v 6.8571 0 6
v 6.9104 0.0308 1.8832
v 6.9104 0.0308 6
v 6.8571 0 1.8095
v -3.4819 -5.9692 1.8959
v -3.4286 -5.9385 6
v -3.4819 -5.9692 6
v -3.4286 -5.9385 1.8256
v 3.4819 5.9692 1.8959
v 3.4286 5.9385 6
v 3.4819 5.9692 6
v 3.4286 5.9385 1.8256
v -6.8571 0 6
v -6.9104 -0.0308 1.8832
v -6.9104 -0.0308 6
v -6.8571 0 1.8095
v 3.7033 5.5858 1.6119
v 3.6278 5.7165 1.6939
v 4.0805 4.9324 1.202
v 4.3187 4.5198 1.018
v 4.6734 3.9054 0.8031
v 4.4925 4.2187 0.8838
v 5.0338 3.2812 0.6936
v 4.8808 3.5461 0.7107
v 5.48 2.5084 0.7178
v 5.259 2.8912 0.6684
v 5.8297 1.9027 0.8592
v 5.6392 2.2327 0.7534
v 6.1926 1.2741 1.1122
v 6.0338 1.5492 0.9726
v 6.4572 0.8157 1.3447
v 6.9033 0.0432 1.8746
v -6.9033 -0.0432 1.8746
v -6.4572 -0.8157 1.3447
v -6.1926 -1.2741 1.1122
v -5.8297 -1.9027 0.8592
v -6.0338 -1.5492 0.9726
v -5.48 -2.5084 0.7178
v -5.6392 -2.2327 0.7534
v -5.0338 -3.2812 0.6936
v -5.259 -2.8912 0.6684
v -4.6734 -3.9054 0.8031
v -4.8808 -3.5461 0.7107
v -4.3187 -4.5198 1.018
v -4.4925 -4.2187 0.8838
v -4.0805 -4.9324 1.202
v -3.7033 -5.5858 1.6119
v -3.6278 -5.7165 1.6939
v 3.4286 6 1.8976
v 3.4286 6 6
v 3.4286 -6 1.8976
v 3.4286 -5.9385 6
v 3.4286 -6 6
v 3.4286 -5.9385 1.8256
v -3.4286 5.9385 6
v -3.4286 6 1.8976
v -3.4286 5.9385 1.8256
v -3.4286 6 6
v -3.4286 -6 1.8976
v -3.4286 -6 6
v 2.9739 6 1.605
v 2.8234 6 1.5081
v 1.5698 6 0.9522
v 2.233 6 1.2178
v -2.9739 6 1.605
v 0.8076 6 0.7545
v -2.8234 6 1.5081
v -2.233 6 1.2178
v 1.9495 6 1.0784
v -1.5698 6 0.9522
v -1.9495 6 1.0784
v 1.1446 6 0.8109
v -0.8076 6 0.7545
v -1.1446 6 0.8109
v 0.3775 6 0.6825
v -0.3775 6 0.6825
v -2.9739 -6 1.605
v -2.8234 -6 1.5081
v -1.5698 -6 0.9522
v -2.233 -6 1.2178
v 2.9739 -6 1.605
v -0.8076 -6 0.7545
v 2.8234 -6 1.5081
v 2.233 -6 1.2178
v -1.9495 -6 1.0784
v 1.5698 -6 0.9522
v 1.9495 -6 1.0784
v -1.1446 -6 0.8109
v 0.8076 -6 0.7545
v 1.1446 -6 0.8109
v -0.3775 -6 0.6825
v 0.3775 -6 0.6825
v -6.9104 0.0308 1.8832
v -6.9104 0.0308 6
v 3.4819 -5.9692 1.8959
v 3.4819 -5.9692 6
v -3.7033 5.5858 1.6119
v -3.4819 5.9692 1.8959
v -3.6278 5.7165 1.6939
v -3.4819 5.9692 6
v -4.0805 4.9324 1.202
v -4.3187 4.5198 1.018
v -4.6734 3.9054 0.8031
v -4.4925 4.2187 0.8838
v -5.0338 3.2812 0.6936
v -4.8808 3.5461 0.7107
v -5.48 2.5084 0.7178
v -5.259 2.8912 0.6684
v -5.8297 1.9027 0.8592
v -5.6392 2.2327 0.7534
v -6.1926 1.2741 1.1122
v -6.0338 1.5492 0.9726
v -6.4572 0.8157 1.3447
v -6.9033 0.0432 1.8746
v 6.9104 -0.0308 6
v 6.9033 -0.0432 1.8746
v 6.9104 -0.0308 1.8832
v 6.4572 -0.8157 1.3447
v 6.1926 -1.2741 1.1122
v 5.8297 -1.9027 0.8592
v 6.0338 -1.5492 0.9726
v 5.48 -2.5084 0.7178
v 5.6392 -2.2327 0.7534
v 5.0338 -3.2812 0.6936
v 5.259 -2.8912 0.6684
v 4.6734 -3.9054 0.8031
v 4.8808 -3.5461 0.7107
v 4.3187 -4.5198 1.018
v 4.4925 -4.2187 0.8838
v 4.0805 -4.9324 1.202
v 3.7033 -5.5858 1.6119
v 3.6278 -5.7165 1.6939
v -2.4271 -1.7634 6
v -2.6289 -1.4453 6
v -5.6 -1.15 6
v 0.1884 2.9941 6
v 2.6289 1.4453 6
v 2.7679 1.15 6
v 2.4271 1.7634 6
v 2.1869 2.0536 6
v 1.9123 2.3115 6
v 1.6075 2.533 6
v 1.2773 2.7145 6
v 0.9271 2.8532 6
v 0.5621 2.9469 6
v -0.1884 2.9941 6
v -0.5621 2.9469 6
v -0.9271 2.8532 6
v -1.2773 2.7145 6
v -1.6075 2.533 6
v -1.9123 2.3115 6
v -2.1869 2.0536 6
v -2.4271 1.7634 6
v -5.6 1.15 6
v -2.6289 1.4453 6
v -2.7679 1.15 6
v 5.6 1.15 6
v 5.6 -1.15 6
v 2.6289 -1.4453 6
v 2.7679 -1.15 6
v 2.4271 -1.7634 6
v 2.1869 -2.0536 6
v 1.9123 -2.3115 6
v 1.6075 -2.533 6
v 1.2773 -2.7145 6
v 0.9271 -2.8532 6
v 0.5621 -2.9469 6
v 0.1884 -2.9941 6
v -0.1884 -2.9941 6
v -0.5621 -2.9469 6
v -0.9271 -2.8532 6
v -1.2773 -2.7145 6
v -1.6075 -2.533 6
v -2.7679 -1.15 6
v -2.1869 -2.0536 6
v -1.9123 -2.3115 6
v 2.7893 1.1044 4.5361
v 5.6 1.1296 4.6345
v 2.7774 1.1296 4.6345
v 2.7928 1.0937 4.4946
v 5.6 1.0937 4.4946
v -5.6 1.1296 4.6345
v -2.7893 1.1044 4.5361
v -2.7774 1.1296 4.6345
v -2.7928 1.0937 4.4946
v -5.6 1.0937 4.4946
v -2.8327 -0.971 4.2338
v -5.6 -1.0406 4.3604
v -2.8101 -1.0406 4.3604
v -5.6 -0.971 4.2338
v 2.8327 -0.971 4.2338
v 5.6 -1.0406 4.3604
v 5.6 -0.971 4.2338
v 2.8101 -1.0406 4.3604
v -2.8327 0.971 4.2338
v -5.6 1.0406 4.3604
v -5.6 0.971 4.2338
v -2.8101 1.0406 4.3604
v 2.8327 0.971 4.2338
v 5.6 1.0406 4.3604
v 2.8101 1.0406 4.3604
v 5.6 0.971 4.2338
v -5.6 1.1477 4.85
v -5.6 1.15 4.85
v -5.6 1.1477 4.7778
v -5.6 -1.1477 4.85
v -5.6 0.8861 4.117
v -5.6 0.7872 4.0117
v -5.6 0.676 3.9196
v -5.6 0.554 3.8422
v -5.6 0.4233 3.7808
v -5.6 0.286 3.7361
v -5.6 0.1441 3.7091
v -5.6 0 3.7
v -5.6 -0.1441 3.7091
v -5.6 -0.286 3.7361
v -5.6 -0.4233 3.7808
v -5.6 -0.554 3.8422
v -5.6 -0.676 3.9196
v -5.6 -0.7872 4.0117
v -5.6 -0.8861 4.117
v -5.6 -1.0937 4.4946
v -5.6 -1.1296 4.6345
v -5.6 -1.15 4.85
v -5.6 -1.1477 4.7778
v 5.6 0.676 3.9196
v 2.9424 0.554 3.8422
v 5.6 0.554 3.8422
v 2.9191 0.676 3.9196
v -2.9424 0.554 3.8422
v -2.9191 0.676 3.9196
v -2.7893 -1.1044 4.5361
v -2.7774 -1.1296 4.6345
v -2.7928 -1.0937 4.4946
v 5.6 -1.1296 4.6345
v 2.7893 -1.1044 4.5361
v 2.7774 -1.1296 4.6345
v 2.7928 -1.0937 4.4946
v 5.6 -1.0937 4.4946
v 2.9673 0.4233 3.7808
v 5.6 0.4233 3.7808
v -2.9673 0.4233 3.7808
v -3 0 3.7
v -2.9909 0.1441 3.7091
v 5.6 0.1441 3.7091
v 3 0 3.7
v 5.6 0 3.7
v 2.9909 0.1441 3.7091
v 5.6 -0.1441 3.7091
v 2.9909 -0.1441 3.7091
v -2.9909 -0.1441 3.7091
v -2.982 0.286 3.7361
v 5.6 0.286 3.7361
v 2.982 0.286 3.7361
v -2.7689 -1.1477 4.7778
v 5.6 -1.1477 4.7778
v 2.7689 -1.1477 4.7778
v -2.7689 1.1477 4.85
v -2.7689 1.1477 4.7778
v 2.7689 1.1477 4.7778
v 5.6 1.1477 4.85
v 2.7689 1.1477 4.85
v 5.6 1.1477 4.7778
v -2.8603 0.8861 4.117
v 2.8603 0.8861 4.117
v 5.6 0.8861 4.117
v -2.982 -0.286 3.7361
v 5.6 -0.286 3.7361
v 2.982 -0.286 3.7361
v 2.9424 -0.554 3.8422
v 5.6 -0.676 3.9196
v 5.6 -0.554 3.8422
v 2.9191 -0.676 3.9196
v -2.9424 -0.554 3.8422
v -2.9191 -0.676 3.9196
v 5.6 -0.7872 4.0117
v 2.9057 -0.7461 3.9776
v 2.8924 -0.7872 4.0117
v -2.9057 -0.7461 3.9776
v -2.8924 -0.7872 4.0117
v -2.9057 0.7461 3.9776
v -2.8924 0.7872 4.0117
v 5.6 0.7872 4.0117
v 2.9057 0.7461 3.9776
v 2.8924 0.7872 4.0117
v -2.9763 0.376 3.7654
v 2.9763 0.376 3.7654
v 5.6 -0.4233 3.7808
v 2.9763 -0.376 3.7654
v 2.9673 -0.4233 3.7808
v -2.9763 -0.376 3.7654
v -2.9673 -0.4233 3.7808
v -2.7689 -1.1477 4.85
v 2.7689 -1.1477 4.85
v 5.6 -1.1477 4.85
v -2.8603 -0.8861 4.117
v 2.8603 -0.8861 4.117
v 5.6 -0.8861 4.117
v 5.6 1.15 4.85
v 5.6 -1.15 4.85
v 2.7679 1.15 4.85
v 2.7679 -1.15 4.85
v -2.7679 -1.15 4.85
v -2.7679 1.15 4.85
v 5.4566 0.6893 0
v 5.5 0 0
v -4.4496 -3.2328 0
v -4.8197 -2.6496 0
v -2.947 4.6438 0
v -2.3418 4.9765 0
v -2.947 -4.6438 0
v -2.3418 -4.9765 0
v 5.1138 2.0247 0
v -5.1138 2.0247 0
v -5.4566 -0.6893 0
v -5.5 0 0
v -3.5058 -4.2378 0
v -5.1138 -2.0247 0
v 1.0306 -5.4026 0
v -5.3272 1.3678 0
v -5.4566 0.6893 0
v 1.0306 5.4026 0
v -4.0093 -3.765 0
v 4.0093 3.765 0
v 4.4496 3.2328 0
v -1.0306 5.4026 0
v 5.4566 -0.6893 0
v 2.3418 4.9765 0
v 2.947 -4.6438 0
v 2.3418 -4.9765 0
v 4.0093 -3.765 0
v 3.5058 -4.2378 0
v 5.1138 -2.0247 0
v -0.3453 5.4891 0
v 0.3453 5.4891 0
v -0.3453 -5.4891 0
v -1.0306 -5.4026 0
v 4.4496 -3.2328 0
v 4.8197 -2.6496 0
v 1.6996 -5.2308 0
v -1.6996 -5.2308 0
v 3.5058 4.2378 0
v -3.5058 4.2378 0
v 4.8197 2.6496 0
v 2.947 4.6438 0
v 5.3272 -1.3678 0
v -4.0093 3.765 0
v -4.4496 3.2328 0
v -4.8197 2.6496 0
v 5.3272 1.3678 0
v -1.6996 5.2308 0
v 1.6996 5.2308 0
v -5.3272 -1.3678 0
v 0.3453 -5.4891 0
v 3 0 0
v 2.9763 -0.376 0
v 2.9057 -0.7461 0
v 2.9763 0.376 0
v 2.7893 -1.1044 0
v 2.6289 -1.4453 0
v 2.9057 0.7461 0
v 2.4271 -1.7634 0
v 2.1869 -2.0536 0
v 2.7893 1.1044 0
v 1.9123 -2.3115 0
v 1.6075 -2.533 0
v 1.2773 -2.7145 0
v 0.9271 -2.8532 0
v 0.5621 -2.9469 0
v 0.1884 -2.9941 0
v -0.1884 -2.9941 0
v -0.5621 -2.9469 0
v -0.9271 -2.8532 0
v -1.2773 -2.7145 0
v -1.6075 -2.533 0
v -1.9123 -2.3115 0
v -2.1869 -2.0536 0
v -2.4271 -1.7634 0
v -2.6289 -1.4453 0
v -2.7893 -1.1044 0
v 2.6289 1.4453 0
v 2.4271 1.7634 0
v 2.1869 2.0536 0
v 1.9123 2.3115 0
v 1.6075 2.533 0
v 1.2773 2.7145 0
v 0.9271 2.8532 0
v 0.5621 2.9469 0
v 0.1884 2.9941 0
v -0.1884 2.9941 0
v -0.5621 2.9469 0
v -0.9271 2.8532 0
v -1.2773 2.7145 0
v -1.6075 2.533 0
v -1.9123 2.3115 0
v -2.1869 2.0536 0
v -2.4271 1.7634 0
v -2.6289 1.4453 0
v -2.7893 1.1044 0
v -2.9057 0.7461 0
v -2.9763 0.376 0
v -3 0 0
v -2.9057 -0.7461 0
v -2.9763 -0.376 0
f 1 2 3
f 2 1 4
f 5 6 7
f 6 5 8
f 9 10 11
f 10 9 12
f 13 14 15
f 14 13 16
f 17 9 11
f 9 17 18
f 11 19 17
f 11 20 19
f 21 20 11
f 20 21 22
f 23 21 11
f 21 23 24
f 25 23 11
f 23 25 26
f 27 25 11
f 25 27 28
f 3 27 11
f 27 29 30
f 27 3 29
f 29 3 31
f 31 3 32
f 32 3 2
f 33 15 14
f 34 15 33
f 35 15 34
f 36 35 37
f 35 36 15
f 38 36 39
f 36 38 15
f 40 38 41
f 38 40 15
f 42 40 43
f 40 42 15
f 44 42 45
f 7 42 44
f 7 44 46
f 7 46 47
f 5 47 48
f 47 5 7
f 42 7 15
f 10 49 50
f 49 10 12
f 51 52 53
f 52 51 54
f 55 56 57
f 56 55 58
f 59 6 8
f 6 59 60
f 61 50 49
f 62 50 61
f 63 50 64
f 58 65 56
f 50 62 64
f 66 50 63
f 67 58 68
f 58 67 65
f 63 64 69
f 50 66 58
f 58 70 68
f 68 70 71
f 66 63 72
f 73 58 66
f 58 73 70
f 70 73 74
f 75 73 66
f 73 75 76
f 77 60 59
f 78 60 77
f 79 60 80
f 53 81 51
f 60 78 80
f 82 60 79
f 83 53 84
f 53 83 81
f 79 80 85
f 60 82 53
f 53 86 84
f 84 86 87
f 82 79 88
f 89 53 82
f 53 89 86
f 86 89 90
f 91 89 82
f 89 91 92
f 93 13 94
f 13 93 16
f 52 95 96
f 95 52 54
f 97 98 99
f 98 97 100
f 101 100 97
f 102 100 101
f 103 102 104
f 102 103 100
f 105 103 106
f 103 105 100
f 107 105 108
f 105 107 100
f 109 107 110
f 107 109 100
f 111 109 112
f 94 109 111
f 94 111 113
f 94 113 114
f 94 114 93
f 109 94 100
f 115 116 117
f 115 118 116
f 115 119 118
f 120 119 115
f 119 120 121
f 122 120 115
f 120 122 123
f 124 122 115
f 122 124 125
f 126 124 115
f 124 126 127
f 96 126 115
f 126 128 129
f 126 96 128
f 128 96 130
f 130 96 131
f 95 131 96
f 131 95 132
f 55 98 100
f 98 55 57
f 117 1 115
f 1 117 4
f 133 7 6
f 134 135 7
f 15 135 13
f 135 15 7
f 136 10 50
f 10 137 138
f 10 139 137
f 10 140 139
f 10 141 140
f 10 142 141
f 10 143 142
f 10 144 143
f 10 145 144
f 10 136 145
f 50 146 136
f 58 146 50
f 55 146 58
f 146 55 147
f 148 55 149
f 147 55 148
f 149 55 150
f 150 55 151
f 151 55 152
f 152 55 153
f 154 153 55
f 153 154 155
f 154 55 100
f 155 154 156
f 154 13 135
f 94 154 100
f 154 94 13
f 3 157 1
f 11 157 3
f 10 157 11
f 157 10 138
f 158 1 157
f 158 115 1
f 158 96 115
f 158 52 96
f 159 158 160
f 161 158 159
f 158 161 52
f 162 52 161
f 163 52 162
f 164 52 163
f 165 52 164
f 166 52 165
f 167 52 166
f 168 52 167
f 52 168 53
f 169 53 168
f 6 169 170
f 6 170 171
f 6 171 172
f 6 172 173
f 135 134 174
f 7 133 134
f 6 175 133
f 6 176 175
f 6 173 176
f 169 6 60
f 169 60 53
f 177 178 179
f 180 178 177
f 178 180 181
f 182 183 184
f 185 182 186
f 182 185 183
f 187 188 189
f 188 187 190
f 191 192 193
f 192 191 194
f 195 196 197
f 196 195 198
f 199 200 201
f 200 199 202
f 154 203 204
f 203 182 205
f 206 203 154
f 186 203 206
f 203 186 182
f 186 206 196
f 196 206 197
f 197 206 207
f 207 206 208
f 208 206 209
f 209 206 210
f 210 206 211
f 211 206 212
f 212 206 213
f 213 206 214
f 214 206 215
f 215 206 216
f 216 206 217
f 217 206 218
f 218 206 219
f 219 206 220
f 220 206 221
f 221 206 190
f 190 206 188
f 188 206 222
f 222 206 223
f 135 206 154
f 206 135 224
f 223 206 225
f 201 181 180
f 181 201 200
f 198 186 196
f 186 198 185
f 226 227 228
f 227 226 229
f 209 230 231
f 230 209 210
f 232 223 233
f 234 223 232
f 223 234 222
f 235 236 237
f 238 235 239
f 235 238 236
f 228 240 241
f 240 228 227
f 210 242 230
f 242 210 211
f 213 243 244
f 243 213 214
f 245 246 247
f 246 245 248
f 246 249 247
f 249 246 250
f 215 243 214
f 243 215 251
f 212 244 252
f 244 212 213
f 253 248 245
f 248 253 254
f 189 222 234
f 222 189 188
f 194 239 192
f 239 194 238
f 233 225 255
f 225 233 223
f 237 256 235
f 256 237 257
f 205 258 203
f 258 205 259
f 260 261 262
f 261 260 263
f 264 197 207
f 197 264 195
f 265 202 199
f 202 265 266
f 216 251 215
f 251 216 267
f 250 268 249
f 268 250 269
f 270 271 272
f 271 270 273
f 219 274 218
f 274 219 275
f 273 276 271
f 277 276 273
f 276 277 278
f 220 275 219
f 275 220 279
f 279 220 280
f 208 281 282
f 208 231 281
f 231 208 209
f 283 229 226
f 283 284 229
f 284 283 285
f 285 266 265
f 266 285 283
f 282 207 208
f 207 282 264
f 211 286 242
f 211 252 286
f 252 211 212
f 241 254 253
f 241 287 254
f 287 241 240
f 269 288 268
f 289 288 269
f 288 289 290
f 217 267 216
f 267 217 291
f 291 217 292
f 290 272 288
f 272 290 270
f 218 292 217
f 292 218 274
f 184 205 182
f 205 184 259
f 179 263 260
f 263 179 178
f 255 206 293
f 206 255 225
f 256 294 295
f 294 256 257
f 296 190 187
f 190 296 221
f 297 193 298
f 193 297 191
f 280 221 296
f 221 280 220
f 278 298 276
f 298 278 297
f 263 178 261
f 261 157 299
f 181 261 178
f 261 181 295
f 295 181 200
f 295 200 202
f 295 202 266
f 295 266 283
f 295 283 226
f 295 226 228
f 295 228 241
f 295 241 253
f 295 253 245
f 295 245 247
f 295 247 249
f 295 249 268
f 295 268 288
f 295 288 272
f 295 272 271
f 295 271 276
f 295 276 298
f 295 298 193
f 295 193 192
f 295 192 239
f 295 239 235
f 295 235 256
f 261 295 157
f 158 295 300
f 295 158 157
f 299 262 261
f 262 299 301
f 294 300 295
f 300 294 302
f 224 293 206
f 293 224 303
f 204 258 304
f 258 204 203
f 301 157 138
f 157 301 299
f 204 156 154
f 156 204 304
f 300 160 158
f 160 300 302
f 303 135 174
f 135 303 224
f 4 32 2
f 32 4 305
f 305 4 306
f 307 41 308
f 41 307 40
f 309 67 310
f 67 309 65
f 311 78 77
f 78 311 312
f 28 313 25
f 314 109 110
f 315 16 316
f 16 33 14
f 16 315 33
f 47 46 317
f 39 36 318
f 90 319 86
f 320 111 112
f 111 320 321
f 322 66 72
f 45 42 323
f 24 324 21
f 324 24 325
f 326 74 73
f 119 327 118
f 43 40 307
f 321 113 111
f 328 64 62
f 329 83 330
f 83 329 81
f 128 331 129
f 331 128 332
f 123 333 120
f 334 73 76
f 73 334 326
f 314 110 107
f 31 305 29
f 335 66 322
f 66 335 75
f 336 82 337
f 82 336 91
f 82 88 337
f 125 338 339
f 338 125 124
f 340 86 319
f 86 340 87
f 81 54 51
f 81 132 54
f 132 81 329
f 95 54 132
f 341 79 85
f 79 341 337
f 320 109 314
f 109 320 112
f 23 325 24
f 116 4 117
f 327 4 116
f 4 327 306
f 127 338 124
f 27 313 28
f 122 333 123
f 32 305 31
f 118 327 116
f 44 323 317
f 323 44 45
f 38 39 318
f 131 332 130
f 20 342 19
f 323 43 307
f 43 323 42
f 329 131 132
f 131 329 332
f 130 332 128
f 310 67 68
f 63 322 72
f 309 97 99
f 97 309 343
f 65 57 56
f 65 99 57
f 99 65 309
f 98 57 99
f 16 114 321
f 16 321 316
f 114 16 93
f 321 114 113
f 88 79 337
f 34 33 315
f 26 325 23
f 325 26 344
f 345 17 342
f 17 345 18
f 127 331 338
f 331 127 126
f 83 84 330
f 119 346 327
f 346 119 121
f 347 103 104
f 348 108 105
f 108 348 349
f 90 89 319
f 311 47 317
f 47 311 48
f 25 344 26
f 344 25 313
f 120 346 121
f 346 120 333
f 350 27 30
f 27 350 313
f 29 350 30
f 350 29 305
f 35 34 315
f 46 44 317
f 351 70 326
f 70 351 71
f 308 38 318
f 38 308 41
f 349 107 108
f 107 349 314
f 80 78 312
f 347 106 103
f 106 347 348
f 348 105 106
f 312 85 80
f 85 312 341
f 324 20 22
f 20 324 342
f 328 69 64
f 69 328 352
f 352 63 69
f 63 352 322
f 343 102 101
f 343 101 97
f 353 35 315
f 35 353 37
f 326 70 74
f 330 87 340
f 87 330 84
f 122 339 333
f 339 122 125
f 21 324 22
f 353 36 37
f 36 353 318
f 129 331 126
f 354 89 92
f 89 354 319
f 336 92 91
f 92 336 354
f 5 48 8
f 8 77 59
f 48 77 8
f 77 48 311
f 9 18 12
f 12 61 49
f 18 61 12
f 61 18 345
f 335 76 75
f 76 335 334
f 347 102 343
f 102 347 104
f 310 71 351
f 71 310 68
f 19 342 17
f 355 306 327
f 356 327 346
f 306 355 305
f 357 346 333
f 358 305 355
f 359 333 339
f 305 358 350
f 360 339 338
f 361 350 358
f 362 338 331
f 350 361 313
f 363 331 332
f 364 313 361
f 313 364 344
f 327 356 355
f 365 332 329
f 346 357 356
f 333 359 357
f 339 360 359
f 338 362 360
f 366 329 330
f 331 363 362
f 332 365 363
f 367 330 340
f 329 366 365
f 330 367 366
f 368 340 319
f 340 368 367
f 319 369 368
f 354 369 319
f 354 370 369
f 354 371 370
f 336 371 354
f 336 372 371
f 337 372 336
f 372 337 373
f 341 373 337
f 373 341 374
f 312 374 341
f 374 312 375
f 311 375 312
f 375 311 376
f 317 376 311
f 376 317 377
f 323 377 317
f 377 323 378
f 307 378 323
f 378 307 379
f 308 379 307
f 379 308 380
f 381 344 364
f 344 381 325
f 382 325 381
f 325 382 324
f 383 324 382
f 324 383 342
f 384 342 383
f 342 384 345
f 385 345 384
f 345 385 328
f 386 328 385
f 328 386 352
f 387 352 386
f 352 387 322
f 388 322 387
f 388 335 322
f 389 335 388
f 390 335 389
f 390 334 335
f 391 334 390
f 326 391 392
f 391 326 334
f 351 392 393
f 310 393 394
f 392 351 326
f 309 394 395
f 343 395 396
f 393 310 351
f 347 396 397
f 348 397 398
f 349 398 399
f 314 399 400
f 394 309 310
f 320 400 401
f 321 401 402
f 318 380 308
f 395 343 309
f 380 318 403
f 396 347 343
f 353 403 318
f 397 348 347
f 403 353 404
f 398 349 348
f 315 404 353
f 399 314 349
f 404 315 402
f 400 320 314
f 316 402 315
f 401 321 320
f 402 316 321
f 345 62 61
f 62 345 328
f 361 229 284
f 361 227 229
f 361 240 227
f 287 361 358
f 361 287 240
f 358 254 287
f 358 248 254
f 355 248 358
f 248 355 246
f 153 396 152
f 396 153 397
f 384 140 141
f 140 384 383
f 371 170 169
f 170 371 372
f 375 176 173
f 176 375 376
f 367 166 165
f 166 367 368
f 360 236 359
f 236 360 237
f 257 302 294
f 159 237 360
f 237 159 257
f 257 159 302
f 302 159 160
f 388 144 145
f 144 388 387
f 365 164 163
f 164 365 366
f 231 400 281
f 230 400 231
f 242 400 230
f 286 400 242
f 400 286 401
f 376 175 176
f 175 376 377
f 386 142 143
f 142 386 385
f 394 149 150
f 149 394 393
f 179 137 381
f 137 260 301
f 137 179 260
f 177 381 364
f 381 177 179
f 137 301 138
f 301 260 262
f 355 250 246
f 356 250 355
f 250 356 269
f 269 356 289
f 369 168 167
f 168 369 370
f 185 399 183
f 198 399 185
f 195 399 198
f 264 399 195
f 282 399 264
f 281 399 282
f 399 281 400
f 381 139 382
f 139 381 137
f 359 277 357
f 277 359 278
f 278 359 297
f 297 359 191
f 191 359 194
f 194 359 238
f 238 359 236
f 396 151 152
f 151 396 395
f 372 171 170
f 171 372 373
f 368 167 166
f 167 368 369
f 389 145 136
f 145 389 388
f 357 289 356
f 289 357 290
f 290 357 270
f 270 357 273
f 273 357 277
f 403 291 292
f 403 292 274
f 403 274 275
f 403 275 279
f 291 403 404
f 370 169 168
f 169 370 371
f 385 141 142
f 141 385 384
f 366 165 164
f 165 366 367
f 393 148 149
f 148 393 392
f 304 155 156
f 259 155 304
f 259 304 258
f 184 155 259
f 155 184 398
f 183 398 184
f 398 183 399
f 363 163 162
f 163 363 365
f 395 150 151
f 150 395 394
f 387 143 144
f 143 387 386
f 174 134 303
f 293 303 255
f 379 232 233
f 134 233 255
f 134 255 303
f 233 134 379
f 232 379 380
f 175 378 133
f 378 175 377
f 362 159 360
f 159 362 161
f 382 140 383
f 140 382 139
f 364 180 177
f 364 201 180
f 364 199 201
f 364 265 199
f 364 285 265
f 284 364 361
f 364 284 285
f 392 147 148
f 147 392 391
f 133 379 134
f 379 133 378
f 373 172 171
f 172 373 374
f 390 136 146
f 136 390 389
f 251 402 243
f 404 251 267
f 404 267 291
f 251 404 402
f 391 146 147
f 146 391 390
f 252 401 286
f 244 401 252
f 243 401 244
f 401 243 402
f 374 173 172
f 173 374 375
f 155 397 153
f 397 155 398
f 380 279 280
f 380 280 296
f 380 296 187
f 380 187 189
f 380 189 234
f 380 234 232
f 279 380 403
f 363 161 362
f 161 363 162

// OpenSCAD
include <MCAD/shapes.scad>;

$fn = 50;	// rounded edge quality (# of faces per 360 degrees)

hex_mm = 12;		// adjust hex size, default 12
// HEX PART HEIGHT -- MODIFY THIS!
hex_height = 6;	// adjust your rim offset, default 6
pin_depth = 2.3;	// adjust for deeper or shallower pin engagement depth, default 2.3
pin_length = 11.2;	// length of axle pin, default 11.2
pin_width = 2.3;	// width of axle pin, default 2.3
axle_hole = 3;		// axle hole diameter, default 3
flare_height = 2;	// flare lead-in up the side of the hex body, default 2

difference(){	// put hole all the way through
	union(){	// combine fillet shape (base) with rest of hex body
		difference(){	// cut rectangular slot from hex body
			translate([0,0,(hex_height-flare_height-((hex_height-6)/2))]) hexagon(hex_mm,(hex_height-flare_height));	// 12mm hex
			 translate([0,0,(hex_height-(pin_depth/2))]) rotate([90,90,90]) cylinder(pin_length,(pin_depth/2),(pin_depth/2), center = true);	// pin cut-out cylinder
			 translate([(pin_length/2*-1),(pin_width/2*-1),(hex_height-(pin_depth/2))]) cube(size=[pin_length,pin_width,pin_depth+1], center = false);	// pin cut-out rectangle
		}
		difference(){	// clear anything extending beyond hex_mm size
			cylinder(flare_height,5.5,7);	// flared-out cylinder to create fillet
			difference(){	// chop off extra bits of flared-out cylinder
				hexagon((hex_mm+3),(flare_height*2));	// hex "od"
				hexagon(hex_mm,(flare_height*2));		// hex "id"
				}
		}
	}
	cylinder(hex_height,axle_hole,axle_hole);
}
